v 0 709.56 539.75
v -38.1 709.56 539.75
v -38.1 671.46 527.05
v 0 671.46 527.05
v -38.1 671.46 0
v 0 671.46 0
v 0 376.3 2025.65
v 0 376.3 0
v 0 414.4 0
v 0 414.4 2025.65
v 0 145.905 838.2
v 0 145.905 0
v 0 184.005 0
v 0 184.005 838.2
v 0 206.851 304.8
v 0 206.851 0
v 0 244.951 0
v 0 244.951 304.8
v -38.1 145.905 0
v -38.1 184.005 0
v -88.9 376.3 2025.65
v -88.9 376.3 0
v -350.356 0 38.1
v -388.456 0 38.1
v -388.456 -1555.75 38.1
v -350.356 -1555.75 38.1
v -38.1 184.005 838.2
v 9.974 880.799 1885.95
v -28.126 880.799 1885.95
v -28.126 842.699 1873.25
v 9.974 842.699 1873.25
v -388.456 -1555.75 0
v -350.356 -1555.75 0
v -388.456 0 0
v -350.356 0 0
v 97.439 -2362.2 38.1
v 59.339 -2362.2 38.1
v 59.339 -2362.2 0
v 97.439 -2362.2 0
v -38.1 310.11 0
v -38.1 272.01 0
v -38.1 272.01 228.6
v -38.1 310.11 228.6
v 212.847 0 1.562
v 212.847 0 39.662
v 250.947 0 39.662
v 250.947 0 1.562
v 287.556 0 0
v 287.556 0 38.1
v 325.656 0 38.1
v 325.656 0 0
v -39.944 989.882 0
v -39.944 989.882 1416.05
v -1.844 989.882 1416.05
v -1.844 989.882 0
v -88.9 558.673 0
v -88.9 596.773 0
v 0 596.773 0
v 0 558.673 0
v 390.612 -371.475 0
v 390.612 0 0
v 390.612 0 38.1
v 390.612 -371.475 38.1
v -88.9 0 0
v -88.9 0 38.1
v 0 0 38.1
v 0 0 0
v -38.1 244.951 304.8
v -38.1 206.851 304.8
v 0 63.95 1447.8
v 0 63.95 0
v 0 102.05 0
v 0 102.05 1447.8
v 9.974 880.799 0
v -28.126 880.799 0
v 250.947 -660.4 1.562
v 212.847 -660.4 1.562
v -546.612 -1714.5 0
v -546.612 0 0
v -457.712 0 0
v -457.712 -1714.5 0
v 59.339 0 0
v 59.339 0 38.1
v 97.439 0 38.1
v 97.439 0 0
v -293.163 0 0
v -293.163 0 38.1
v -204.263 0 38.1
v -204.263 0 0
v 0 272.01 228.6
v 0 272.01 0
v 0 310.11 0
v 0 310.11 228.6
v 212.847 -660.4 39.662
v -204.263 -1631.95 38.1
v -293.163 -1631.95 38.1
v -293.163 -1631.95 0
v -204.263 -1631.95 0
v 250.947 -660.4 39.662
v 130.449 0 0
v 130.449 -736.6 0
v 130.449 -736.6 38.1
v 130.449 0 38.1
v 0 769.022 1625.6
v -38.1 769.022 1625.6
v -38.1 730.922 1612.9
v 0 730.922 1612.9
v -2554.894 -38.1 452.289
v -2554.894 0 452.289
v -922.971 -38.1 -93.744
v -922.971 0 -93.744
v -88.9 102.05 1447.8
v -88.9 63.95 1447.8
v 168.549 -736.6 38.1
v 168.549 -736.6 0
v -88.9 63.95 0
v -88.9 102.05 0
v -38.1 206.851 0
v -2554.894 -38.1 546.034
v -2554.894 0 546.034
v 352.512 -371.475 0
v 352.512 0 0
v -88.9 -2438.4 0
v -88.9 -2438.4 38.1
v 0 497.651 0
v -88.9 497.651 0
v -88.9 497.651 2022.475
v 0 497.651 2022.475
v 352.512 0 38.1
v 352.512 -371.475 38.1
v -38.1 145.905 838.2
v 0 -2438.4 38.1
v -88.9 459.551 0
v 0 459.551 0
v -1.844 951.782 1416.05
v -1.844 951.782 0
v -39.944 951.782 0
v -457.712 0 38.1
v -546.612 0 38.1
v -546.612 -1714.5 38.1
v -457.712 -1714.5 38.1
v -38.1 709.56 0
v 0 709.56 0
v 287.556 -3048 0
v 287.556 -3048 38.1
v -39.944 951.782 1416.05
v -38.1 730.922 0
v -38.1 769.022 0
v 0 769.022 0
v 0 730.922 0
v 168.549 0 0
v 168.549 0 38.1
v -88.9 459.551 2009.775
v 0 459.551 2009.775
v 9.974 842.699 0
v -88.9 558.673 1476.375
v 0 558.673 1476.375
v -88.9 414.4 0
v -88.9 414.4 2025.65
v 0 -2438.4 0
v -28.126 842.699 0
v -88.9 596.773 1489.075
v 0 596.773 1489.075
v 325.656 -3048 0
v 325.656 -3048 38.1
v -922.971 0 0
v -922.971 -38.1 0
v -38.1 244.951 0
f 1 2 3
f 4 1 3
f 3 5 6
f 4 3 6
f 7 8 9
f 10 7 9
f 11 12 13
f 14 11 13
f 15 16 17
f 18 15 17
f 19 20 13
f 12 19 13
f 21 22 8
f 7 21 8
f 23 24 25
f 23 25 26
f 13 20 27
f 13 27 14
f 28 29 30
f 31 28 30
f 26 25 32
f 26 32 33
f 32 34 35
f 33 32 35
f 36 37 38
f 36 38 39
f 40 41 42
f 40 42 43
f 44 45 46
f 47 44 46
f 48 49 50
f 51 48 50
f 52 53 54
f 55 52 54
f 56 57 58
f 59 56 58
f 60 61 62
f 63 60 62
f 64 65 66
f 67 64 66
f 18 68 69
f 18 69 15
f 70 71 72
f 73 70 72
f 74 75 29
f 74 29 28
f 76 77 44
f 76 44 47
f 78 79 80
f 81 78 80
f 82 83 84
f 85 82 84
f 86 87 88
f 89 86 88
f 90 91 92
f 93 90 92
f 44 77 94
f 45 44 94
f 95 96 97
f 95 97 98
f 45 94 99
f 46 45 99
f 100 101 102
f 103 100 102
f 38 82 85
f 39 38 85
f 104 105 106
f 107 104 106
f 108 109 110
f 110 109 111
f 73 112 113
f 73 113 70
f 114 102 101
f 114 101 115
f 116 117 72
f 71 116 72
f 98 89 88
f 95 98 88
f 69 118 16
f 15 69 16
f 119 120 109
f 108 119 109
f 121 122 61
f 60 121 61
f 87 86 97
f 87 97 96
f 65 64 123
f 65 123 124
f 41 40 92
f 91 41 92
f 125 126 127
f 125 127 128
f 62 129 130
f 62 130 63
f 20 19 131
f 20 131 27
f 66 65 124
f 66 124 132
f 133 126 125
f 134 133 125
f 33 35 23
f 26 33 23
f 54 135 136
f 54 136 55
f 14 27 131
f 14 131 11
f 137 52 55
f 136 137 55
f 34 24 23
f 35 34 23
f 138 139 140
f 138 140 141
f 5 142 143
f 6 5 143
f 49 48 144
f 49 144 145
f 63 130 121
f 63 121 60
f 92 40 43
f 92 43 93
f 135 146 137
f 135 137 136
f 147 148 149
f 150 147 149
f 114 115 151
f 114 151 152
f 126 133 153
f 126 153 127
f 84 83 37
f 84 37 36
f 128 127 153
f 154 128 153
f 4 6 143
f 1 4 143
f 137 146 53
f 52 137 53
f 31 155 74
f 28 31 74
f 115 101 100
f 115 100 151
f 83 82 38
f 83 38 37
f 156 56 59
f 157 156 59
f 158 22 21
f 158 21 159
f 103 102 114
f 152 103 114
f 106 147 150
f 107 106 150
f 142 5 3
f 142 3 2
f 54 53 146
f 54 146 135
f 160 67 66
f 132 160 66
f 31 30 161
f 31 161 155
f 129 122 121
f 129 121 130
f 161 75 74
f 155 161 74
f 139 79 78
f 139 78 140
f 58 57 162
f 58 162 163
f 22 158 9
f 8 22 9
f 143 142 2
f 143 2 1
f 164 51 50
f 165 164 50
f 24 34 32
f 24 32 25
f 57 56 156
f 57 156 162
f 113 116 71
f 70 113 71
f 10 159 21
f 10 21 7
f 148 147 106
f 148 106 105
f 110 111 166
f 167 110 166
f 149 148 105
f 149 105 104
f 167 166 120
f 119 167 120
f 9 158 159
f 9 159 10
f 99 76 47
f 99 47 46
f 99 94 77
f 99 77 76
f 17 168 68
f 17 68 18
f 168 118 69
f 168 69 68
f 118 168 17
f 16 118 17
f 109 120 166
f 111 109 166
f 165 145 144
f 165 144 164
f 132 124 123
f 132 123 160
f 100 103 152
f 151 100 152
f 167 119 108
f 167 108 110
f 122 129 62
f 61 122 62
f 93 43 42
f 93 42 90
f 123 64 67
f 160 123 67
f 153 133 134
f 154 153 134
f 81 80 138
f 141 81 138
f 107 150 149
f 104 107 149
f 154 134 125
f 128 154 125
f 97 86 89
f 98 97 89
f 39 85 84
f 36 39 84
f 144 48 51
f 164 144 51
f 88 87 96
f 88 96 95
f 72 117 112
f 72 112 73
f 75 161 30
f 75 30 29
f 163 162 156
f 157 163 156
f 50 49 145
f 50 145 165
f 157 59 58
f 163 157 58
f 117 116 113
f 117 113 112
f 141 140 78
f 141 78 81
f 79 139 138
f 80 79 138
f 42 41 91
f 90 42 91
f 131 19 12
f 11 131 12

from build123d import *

# Parameters (mm, degrees)
F0_W      = 88.9
F0_H      = 38.1
F1_DEPTH  = 2438.4
F2_W      = 88.9
F2_H      = 38.1
F3_DEPTH  = 1447.8
F4_W      = 38.1
F4_H      = 38.1
F5_DEPTH  = 2362.2
F6_W      = 38.1
F6_H      = 38.1
F7_DEPTH  = 838.2
F8_W      = 38.1
F8_H      = 38.1
F9_DEPTH  = 228.6
F10_W     = 38.1
F10_H     = 38.1
F11_DEPTH = 304.8
F12_W     = 88.9
F12_H     = 38.1
F13_DEPTH = 2025.65
F14_W     = 88.9
F14_H     = 38.1
F15_DEPTH = 1631.95
F16_W     = 38.1
F16_H     = 38.1
F17_DEPTH = 1555.75
F18_W     = 88.9
F18_H     = 38.1
F19_DEPTH = 2022.475
F21_DEPTH = 88.9
F22_W     = 88.9
F22_H     = 38.1
F23_DEPTH = 1489.075
F25_DEPTH = 88.9
F26_W     = 88.9
F26_H     = 38.1
F27_DEPTH = 1714.5
F28_W     = 38.1
F28_H     = 38.1
F29_DEPTH = 539.75
F31_DEPTH = 38.1
F33_DEPTH = 38.1
F34_W     = 38.1
F34_H     = 38.1
F35_DEPTH = 1625.6
F36_W     = 38.1
F36_H     = 38.1
F37_DEPTH = 1885.95
F39_DEPTH = 38.1
F41_DEPTH = 38.1
F42_W     = 38.1
F42_H     = 38.1
F43_DEPTH = 736.6
F44_W     = 38.1
F44_H     = 38.1
F45_DEPTH = 660.4
F46_W     = 38.1
F46_H     = 38.1
F47_DEPTH = 1416.05
F48_W     = 38.1
F48_H     = 38.1
F49_DEPTH = 3048
F50_W     = 38.1
F50_H     = 38.1
F51_DEPTH = 371.475


with BuildPart() as f1:
    # F0 (on Front) → F1 (new body)
    with BuildSketch(Plane.XZ):
        with Locations((-44.45, 19.05)):
            Rectangle(F0_W, F0_H)
    extrude(amount=F1_DEPTH)


with BuildPart() as f3:
    # F2 (on Top) → F3 (new body)
    with BuildSketch(Plane.XY):
        with Locations((-44.45, 83.000144)):
            Rectangle(F2_W, F2_H)
    extrude(amount=F3_DEPTH)


with BuildPart() as f5:
    # F4 (on Front) → F5 (new body)
    with BuildSketch(Plane.XZ):
        with Locations((78.388591, 19.05)):
            Rectangle(F4_W, F4_H)
    extrude(amount=F5_DEPTH)


with BuildPart() as f7:
    # F6 (on Top) → F7 (new body)
    with BuildSketch(Plane.XY):
        with Locations((-19.05, 164.954718)):
            Rectangle(F6_W, F6_H)
    extrude(amount=F7_DEPTH)


with BuildPart() as f9:
    # F8 (on Top) → F9 (new body)
    with BuildSketch(Plane.XY):
        with Locations((-19.05, 291.060236)):
            Rectangle(F8_W, F8_H)
    extrude(amount=F9_DEPTH)


with BuildPart() as f11:
    # F10 (on Top) → F11 (new body)
    with BuildSketch(Plane.XY):
        with Locations((-19.05, 225.900951)):
            Rectangle(F10_W, F10_H)
    extrude(amount=F11_DEPTH)


with BuildPart() as f13:
    # F12 (on Top) → F13 (new body)
    with BuildSketch(Plane.XY):
        with Locations((-44.45, 395.349612)):
            Rectangle(F12_W, F12_H)
    extrude(amount=F13_DEPTH)


with BuildPart() as f15:
    # F14 (on Front) → F15 (new body)
    with BuildSketch(Plane.XZ):
        with Locations((-248.712714, 19.05)):
            Rectangle(F14_W, F14_H)
    extrude(amount=F15_DEPTH)


with BuildPart() as f17:
    # F16 (on Front) → F17 (new body)
    with BuildSketch(Plane.XZ):
        with Locations((-369.40583, 19.05)):
            Rectangle(F16_W, F16_H)
    extrude(amount=F17_DEPTH)


with BuildPart() as f19:
    # F18 (on Top) → F19 (new body)
    with BuildSketch(Plane.XY):
        with Locations((-44.45, 478.600885)):
            Rectangle(F18_W, F18_H)
    extrude(amount=F19_DEPTH)

    # F20 (on face) → F21 (cut)
    with BuildSketch(Plane(origin=(-88.9, 0, 0), x_dir=(0, -1, 0), z_dir=(-1, 0, 0))):
        Polygon((-459.550885, 2022.475), (-497.650885, 2022.475), (-459.550885, 2009.775), align=None)
    extrude(amount=-F21_DEPTH, mode=Mode.SUBTRACT)


with BuildPart() as f23:
    # F22 (on Top) → F23 (new body)
    with BuildSketch(Plane.XY):
        with Locations((-44.45, 577.723007)):
            Rectangle(F22_W, F22_H)
    extrude(amount=F23_DEPTH)

    # F24 (on face) → F25 (cut)
    with BuildSketch(Plane(origin=(-88.9, 0, 0), x_dir=(0, -1, 0), z_dir=(-1, 0, 0))):
        Polygon((-558.673007, 1489.075), (-596.773007, 1489.075), (-558.673007, 1476.375), align=None)
    extrude(amount=-F25_DEPTH, mode=Mode.SUBTRACT)


with BuildPart() as f27:
    # F26 (on Front) → F27 (new body)
    with BuildSketch(Plane.XZ):
        with Locations((-502.16171, 19.05)):
            Rectangle(F26_W, F26_H)
    extrude(amount=F27_DEPTH)


with BuildPart() as f29:
    # F28 (on Top) → F29 (new body)
    with BuildSketch(Plane.XY):
        with Locations((-19.05, 690.509711)):
            Rectangle(F28_W, F28_H)
    extrude(amount=F29_DEPTH)

    # F30 (on face) → F31 (cut)
    with BuildSketch(Plane(origin=(-38.1, 0, 0), x_dir=(0, -1, 0), z_dir=(-1, 0, 0))):
        Polygon((-671.459711, 539.75), (-709.559711, 539.75), (-671.459711, 527.05), align=None)
    extrude(amount=-F31_DEPTH, mode=Mode.SUBTRACT)


with BuildPart() as f33:
    # F32 (on Front) → F33 (new body)
    with BuildSketch(Plane.XZ):
        Polygon((-922.971252, -93.744366), (-922.971252, 0), (-2554.894014, 546.033718), (-2554.894014, 452.289352), align=None)
    extrude(amount=F33_DEPTH)


with BuildPart() as f35:
    # F34 (on Top) → F35 (new body)
    with BuildSketch(Plane.XY):
        with Locations((-19.05, 749.972452)):
            Rectangle(F34_W, F34_H)
    extrude(amount=F35_DEPTH)

    # F40 (on face) → F41 (cut)
    with BuildSketch(Plane(origin=(-38.1, 0, 0), x_dir=(0, -1, 0), z_dir=(-1, 0, 0))):
        Polygon((-730.922452, 1625.6), (-769.022452, 1625.6), (-730.922452, 1612.9), align=None)
    extrude(amount=-F41_DEPTH, mode=Mode.SUBTRACT)


with BuildPart() as f37:
    # F36 (on Top) → F37 (new body)
    with BuildSketch(Plane.XY):
        with Locations((-9.075996, 861.749172)):
            Rectangle(F36_W, F36_H)
    extrude(amount=F37_DEPTH)

    # F38 (on face) → F39 (cut)
    with BuildSketch(Plane(origin=(-28.125996, 0, 0), x_dir=(0, -1, 0), z_dir=(-1, 0, 0))):
        Polygon((-842.699172, 1885.95), (-880.799172, 1885.95), (-842.699172, 1873.25), align=None)
    extrude(amount=-F39_DEPTH, mode=Mode.SUBTRACT)


with BuildPart() as f43:
    # F42 (on Front) → F43 (new body)
    with BuildSketch(Plane.XZ):
        with Locations((149.499343, 19.05)):
            Rectangle(F42_W, F42_H)
    extrude(amount=F43_DEPTH)


with BuildPart() as f45:
    # F44 (on Front) → F45 (new body)
    with BuildSketch(Plane.XZ):
        with Locations((231.896877, 20.611872)):
            Rectangle(F44_W, F44_H)
    extrude(amount=F45_DEPTH)


with BuildPart() as f47:
    # F46 (on Top) → F47 (new body)
    with BuildSketch(Plane.XY):
        with Locations((-20.894323, 970.831931)):
            Rectangle(F46_W, F46_H)
    extrude(amount=F47_DEPTH)


with BuildPart() as f49:
    # F48 (on Front) → F49 (new body)
    with BuildSketch(Plane.XZ):
        with Locations((306.606193, 19.05)):
            Rectangle(F48_W, F48_H)
    extrude(amount=F49_DEPTH)


with BuildPart() as f51:
    # F50 (on Front) → F51 (new body)
    with BuildSketch(Plane.XZ):
        with Locations((371.562496, 19.05)):
            Rectangle(F50_W, F50_H)
    extrude(amount=F51_DEPTH)


solid = Compound([f1.part, f3.part, f5.part, f7.part, f9.part, f11.part, f13.part, f15.part, f17.part, f19.part, f23.part, f27.part, f29.part, f33.part, f35.part, f37.part, f43.part, f45.part, f47.part, f49.part, f51.part])
